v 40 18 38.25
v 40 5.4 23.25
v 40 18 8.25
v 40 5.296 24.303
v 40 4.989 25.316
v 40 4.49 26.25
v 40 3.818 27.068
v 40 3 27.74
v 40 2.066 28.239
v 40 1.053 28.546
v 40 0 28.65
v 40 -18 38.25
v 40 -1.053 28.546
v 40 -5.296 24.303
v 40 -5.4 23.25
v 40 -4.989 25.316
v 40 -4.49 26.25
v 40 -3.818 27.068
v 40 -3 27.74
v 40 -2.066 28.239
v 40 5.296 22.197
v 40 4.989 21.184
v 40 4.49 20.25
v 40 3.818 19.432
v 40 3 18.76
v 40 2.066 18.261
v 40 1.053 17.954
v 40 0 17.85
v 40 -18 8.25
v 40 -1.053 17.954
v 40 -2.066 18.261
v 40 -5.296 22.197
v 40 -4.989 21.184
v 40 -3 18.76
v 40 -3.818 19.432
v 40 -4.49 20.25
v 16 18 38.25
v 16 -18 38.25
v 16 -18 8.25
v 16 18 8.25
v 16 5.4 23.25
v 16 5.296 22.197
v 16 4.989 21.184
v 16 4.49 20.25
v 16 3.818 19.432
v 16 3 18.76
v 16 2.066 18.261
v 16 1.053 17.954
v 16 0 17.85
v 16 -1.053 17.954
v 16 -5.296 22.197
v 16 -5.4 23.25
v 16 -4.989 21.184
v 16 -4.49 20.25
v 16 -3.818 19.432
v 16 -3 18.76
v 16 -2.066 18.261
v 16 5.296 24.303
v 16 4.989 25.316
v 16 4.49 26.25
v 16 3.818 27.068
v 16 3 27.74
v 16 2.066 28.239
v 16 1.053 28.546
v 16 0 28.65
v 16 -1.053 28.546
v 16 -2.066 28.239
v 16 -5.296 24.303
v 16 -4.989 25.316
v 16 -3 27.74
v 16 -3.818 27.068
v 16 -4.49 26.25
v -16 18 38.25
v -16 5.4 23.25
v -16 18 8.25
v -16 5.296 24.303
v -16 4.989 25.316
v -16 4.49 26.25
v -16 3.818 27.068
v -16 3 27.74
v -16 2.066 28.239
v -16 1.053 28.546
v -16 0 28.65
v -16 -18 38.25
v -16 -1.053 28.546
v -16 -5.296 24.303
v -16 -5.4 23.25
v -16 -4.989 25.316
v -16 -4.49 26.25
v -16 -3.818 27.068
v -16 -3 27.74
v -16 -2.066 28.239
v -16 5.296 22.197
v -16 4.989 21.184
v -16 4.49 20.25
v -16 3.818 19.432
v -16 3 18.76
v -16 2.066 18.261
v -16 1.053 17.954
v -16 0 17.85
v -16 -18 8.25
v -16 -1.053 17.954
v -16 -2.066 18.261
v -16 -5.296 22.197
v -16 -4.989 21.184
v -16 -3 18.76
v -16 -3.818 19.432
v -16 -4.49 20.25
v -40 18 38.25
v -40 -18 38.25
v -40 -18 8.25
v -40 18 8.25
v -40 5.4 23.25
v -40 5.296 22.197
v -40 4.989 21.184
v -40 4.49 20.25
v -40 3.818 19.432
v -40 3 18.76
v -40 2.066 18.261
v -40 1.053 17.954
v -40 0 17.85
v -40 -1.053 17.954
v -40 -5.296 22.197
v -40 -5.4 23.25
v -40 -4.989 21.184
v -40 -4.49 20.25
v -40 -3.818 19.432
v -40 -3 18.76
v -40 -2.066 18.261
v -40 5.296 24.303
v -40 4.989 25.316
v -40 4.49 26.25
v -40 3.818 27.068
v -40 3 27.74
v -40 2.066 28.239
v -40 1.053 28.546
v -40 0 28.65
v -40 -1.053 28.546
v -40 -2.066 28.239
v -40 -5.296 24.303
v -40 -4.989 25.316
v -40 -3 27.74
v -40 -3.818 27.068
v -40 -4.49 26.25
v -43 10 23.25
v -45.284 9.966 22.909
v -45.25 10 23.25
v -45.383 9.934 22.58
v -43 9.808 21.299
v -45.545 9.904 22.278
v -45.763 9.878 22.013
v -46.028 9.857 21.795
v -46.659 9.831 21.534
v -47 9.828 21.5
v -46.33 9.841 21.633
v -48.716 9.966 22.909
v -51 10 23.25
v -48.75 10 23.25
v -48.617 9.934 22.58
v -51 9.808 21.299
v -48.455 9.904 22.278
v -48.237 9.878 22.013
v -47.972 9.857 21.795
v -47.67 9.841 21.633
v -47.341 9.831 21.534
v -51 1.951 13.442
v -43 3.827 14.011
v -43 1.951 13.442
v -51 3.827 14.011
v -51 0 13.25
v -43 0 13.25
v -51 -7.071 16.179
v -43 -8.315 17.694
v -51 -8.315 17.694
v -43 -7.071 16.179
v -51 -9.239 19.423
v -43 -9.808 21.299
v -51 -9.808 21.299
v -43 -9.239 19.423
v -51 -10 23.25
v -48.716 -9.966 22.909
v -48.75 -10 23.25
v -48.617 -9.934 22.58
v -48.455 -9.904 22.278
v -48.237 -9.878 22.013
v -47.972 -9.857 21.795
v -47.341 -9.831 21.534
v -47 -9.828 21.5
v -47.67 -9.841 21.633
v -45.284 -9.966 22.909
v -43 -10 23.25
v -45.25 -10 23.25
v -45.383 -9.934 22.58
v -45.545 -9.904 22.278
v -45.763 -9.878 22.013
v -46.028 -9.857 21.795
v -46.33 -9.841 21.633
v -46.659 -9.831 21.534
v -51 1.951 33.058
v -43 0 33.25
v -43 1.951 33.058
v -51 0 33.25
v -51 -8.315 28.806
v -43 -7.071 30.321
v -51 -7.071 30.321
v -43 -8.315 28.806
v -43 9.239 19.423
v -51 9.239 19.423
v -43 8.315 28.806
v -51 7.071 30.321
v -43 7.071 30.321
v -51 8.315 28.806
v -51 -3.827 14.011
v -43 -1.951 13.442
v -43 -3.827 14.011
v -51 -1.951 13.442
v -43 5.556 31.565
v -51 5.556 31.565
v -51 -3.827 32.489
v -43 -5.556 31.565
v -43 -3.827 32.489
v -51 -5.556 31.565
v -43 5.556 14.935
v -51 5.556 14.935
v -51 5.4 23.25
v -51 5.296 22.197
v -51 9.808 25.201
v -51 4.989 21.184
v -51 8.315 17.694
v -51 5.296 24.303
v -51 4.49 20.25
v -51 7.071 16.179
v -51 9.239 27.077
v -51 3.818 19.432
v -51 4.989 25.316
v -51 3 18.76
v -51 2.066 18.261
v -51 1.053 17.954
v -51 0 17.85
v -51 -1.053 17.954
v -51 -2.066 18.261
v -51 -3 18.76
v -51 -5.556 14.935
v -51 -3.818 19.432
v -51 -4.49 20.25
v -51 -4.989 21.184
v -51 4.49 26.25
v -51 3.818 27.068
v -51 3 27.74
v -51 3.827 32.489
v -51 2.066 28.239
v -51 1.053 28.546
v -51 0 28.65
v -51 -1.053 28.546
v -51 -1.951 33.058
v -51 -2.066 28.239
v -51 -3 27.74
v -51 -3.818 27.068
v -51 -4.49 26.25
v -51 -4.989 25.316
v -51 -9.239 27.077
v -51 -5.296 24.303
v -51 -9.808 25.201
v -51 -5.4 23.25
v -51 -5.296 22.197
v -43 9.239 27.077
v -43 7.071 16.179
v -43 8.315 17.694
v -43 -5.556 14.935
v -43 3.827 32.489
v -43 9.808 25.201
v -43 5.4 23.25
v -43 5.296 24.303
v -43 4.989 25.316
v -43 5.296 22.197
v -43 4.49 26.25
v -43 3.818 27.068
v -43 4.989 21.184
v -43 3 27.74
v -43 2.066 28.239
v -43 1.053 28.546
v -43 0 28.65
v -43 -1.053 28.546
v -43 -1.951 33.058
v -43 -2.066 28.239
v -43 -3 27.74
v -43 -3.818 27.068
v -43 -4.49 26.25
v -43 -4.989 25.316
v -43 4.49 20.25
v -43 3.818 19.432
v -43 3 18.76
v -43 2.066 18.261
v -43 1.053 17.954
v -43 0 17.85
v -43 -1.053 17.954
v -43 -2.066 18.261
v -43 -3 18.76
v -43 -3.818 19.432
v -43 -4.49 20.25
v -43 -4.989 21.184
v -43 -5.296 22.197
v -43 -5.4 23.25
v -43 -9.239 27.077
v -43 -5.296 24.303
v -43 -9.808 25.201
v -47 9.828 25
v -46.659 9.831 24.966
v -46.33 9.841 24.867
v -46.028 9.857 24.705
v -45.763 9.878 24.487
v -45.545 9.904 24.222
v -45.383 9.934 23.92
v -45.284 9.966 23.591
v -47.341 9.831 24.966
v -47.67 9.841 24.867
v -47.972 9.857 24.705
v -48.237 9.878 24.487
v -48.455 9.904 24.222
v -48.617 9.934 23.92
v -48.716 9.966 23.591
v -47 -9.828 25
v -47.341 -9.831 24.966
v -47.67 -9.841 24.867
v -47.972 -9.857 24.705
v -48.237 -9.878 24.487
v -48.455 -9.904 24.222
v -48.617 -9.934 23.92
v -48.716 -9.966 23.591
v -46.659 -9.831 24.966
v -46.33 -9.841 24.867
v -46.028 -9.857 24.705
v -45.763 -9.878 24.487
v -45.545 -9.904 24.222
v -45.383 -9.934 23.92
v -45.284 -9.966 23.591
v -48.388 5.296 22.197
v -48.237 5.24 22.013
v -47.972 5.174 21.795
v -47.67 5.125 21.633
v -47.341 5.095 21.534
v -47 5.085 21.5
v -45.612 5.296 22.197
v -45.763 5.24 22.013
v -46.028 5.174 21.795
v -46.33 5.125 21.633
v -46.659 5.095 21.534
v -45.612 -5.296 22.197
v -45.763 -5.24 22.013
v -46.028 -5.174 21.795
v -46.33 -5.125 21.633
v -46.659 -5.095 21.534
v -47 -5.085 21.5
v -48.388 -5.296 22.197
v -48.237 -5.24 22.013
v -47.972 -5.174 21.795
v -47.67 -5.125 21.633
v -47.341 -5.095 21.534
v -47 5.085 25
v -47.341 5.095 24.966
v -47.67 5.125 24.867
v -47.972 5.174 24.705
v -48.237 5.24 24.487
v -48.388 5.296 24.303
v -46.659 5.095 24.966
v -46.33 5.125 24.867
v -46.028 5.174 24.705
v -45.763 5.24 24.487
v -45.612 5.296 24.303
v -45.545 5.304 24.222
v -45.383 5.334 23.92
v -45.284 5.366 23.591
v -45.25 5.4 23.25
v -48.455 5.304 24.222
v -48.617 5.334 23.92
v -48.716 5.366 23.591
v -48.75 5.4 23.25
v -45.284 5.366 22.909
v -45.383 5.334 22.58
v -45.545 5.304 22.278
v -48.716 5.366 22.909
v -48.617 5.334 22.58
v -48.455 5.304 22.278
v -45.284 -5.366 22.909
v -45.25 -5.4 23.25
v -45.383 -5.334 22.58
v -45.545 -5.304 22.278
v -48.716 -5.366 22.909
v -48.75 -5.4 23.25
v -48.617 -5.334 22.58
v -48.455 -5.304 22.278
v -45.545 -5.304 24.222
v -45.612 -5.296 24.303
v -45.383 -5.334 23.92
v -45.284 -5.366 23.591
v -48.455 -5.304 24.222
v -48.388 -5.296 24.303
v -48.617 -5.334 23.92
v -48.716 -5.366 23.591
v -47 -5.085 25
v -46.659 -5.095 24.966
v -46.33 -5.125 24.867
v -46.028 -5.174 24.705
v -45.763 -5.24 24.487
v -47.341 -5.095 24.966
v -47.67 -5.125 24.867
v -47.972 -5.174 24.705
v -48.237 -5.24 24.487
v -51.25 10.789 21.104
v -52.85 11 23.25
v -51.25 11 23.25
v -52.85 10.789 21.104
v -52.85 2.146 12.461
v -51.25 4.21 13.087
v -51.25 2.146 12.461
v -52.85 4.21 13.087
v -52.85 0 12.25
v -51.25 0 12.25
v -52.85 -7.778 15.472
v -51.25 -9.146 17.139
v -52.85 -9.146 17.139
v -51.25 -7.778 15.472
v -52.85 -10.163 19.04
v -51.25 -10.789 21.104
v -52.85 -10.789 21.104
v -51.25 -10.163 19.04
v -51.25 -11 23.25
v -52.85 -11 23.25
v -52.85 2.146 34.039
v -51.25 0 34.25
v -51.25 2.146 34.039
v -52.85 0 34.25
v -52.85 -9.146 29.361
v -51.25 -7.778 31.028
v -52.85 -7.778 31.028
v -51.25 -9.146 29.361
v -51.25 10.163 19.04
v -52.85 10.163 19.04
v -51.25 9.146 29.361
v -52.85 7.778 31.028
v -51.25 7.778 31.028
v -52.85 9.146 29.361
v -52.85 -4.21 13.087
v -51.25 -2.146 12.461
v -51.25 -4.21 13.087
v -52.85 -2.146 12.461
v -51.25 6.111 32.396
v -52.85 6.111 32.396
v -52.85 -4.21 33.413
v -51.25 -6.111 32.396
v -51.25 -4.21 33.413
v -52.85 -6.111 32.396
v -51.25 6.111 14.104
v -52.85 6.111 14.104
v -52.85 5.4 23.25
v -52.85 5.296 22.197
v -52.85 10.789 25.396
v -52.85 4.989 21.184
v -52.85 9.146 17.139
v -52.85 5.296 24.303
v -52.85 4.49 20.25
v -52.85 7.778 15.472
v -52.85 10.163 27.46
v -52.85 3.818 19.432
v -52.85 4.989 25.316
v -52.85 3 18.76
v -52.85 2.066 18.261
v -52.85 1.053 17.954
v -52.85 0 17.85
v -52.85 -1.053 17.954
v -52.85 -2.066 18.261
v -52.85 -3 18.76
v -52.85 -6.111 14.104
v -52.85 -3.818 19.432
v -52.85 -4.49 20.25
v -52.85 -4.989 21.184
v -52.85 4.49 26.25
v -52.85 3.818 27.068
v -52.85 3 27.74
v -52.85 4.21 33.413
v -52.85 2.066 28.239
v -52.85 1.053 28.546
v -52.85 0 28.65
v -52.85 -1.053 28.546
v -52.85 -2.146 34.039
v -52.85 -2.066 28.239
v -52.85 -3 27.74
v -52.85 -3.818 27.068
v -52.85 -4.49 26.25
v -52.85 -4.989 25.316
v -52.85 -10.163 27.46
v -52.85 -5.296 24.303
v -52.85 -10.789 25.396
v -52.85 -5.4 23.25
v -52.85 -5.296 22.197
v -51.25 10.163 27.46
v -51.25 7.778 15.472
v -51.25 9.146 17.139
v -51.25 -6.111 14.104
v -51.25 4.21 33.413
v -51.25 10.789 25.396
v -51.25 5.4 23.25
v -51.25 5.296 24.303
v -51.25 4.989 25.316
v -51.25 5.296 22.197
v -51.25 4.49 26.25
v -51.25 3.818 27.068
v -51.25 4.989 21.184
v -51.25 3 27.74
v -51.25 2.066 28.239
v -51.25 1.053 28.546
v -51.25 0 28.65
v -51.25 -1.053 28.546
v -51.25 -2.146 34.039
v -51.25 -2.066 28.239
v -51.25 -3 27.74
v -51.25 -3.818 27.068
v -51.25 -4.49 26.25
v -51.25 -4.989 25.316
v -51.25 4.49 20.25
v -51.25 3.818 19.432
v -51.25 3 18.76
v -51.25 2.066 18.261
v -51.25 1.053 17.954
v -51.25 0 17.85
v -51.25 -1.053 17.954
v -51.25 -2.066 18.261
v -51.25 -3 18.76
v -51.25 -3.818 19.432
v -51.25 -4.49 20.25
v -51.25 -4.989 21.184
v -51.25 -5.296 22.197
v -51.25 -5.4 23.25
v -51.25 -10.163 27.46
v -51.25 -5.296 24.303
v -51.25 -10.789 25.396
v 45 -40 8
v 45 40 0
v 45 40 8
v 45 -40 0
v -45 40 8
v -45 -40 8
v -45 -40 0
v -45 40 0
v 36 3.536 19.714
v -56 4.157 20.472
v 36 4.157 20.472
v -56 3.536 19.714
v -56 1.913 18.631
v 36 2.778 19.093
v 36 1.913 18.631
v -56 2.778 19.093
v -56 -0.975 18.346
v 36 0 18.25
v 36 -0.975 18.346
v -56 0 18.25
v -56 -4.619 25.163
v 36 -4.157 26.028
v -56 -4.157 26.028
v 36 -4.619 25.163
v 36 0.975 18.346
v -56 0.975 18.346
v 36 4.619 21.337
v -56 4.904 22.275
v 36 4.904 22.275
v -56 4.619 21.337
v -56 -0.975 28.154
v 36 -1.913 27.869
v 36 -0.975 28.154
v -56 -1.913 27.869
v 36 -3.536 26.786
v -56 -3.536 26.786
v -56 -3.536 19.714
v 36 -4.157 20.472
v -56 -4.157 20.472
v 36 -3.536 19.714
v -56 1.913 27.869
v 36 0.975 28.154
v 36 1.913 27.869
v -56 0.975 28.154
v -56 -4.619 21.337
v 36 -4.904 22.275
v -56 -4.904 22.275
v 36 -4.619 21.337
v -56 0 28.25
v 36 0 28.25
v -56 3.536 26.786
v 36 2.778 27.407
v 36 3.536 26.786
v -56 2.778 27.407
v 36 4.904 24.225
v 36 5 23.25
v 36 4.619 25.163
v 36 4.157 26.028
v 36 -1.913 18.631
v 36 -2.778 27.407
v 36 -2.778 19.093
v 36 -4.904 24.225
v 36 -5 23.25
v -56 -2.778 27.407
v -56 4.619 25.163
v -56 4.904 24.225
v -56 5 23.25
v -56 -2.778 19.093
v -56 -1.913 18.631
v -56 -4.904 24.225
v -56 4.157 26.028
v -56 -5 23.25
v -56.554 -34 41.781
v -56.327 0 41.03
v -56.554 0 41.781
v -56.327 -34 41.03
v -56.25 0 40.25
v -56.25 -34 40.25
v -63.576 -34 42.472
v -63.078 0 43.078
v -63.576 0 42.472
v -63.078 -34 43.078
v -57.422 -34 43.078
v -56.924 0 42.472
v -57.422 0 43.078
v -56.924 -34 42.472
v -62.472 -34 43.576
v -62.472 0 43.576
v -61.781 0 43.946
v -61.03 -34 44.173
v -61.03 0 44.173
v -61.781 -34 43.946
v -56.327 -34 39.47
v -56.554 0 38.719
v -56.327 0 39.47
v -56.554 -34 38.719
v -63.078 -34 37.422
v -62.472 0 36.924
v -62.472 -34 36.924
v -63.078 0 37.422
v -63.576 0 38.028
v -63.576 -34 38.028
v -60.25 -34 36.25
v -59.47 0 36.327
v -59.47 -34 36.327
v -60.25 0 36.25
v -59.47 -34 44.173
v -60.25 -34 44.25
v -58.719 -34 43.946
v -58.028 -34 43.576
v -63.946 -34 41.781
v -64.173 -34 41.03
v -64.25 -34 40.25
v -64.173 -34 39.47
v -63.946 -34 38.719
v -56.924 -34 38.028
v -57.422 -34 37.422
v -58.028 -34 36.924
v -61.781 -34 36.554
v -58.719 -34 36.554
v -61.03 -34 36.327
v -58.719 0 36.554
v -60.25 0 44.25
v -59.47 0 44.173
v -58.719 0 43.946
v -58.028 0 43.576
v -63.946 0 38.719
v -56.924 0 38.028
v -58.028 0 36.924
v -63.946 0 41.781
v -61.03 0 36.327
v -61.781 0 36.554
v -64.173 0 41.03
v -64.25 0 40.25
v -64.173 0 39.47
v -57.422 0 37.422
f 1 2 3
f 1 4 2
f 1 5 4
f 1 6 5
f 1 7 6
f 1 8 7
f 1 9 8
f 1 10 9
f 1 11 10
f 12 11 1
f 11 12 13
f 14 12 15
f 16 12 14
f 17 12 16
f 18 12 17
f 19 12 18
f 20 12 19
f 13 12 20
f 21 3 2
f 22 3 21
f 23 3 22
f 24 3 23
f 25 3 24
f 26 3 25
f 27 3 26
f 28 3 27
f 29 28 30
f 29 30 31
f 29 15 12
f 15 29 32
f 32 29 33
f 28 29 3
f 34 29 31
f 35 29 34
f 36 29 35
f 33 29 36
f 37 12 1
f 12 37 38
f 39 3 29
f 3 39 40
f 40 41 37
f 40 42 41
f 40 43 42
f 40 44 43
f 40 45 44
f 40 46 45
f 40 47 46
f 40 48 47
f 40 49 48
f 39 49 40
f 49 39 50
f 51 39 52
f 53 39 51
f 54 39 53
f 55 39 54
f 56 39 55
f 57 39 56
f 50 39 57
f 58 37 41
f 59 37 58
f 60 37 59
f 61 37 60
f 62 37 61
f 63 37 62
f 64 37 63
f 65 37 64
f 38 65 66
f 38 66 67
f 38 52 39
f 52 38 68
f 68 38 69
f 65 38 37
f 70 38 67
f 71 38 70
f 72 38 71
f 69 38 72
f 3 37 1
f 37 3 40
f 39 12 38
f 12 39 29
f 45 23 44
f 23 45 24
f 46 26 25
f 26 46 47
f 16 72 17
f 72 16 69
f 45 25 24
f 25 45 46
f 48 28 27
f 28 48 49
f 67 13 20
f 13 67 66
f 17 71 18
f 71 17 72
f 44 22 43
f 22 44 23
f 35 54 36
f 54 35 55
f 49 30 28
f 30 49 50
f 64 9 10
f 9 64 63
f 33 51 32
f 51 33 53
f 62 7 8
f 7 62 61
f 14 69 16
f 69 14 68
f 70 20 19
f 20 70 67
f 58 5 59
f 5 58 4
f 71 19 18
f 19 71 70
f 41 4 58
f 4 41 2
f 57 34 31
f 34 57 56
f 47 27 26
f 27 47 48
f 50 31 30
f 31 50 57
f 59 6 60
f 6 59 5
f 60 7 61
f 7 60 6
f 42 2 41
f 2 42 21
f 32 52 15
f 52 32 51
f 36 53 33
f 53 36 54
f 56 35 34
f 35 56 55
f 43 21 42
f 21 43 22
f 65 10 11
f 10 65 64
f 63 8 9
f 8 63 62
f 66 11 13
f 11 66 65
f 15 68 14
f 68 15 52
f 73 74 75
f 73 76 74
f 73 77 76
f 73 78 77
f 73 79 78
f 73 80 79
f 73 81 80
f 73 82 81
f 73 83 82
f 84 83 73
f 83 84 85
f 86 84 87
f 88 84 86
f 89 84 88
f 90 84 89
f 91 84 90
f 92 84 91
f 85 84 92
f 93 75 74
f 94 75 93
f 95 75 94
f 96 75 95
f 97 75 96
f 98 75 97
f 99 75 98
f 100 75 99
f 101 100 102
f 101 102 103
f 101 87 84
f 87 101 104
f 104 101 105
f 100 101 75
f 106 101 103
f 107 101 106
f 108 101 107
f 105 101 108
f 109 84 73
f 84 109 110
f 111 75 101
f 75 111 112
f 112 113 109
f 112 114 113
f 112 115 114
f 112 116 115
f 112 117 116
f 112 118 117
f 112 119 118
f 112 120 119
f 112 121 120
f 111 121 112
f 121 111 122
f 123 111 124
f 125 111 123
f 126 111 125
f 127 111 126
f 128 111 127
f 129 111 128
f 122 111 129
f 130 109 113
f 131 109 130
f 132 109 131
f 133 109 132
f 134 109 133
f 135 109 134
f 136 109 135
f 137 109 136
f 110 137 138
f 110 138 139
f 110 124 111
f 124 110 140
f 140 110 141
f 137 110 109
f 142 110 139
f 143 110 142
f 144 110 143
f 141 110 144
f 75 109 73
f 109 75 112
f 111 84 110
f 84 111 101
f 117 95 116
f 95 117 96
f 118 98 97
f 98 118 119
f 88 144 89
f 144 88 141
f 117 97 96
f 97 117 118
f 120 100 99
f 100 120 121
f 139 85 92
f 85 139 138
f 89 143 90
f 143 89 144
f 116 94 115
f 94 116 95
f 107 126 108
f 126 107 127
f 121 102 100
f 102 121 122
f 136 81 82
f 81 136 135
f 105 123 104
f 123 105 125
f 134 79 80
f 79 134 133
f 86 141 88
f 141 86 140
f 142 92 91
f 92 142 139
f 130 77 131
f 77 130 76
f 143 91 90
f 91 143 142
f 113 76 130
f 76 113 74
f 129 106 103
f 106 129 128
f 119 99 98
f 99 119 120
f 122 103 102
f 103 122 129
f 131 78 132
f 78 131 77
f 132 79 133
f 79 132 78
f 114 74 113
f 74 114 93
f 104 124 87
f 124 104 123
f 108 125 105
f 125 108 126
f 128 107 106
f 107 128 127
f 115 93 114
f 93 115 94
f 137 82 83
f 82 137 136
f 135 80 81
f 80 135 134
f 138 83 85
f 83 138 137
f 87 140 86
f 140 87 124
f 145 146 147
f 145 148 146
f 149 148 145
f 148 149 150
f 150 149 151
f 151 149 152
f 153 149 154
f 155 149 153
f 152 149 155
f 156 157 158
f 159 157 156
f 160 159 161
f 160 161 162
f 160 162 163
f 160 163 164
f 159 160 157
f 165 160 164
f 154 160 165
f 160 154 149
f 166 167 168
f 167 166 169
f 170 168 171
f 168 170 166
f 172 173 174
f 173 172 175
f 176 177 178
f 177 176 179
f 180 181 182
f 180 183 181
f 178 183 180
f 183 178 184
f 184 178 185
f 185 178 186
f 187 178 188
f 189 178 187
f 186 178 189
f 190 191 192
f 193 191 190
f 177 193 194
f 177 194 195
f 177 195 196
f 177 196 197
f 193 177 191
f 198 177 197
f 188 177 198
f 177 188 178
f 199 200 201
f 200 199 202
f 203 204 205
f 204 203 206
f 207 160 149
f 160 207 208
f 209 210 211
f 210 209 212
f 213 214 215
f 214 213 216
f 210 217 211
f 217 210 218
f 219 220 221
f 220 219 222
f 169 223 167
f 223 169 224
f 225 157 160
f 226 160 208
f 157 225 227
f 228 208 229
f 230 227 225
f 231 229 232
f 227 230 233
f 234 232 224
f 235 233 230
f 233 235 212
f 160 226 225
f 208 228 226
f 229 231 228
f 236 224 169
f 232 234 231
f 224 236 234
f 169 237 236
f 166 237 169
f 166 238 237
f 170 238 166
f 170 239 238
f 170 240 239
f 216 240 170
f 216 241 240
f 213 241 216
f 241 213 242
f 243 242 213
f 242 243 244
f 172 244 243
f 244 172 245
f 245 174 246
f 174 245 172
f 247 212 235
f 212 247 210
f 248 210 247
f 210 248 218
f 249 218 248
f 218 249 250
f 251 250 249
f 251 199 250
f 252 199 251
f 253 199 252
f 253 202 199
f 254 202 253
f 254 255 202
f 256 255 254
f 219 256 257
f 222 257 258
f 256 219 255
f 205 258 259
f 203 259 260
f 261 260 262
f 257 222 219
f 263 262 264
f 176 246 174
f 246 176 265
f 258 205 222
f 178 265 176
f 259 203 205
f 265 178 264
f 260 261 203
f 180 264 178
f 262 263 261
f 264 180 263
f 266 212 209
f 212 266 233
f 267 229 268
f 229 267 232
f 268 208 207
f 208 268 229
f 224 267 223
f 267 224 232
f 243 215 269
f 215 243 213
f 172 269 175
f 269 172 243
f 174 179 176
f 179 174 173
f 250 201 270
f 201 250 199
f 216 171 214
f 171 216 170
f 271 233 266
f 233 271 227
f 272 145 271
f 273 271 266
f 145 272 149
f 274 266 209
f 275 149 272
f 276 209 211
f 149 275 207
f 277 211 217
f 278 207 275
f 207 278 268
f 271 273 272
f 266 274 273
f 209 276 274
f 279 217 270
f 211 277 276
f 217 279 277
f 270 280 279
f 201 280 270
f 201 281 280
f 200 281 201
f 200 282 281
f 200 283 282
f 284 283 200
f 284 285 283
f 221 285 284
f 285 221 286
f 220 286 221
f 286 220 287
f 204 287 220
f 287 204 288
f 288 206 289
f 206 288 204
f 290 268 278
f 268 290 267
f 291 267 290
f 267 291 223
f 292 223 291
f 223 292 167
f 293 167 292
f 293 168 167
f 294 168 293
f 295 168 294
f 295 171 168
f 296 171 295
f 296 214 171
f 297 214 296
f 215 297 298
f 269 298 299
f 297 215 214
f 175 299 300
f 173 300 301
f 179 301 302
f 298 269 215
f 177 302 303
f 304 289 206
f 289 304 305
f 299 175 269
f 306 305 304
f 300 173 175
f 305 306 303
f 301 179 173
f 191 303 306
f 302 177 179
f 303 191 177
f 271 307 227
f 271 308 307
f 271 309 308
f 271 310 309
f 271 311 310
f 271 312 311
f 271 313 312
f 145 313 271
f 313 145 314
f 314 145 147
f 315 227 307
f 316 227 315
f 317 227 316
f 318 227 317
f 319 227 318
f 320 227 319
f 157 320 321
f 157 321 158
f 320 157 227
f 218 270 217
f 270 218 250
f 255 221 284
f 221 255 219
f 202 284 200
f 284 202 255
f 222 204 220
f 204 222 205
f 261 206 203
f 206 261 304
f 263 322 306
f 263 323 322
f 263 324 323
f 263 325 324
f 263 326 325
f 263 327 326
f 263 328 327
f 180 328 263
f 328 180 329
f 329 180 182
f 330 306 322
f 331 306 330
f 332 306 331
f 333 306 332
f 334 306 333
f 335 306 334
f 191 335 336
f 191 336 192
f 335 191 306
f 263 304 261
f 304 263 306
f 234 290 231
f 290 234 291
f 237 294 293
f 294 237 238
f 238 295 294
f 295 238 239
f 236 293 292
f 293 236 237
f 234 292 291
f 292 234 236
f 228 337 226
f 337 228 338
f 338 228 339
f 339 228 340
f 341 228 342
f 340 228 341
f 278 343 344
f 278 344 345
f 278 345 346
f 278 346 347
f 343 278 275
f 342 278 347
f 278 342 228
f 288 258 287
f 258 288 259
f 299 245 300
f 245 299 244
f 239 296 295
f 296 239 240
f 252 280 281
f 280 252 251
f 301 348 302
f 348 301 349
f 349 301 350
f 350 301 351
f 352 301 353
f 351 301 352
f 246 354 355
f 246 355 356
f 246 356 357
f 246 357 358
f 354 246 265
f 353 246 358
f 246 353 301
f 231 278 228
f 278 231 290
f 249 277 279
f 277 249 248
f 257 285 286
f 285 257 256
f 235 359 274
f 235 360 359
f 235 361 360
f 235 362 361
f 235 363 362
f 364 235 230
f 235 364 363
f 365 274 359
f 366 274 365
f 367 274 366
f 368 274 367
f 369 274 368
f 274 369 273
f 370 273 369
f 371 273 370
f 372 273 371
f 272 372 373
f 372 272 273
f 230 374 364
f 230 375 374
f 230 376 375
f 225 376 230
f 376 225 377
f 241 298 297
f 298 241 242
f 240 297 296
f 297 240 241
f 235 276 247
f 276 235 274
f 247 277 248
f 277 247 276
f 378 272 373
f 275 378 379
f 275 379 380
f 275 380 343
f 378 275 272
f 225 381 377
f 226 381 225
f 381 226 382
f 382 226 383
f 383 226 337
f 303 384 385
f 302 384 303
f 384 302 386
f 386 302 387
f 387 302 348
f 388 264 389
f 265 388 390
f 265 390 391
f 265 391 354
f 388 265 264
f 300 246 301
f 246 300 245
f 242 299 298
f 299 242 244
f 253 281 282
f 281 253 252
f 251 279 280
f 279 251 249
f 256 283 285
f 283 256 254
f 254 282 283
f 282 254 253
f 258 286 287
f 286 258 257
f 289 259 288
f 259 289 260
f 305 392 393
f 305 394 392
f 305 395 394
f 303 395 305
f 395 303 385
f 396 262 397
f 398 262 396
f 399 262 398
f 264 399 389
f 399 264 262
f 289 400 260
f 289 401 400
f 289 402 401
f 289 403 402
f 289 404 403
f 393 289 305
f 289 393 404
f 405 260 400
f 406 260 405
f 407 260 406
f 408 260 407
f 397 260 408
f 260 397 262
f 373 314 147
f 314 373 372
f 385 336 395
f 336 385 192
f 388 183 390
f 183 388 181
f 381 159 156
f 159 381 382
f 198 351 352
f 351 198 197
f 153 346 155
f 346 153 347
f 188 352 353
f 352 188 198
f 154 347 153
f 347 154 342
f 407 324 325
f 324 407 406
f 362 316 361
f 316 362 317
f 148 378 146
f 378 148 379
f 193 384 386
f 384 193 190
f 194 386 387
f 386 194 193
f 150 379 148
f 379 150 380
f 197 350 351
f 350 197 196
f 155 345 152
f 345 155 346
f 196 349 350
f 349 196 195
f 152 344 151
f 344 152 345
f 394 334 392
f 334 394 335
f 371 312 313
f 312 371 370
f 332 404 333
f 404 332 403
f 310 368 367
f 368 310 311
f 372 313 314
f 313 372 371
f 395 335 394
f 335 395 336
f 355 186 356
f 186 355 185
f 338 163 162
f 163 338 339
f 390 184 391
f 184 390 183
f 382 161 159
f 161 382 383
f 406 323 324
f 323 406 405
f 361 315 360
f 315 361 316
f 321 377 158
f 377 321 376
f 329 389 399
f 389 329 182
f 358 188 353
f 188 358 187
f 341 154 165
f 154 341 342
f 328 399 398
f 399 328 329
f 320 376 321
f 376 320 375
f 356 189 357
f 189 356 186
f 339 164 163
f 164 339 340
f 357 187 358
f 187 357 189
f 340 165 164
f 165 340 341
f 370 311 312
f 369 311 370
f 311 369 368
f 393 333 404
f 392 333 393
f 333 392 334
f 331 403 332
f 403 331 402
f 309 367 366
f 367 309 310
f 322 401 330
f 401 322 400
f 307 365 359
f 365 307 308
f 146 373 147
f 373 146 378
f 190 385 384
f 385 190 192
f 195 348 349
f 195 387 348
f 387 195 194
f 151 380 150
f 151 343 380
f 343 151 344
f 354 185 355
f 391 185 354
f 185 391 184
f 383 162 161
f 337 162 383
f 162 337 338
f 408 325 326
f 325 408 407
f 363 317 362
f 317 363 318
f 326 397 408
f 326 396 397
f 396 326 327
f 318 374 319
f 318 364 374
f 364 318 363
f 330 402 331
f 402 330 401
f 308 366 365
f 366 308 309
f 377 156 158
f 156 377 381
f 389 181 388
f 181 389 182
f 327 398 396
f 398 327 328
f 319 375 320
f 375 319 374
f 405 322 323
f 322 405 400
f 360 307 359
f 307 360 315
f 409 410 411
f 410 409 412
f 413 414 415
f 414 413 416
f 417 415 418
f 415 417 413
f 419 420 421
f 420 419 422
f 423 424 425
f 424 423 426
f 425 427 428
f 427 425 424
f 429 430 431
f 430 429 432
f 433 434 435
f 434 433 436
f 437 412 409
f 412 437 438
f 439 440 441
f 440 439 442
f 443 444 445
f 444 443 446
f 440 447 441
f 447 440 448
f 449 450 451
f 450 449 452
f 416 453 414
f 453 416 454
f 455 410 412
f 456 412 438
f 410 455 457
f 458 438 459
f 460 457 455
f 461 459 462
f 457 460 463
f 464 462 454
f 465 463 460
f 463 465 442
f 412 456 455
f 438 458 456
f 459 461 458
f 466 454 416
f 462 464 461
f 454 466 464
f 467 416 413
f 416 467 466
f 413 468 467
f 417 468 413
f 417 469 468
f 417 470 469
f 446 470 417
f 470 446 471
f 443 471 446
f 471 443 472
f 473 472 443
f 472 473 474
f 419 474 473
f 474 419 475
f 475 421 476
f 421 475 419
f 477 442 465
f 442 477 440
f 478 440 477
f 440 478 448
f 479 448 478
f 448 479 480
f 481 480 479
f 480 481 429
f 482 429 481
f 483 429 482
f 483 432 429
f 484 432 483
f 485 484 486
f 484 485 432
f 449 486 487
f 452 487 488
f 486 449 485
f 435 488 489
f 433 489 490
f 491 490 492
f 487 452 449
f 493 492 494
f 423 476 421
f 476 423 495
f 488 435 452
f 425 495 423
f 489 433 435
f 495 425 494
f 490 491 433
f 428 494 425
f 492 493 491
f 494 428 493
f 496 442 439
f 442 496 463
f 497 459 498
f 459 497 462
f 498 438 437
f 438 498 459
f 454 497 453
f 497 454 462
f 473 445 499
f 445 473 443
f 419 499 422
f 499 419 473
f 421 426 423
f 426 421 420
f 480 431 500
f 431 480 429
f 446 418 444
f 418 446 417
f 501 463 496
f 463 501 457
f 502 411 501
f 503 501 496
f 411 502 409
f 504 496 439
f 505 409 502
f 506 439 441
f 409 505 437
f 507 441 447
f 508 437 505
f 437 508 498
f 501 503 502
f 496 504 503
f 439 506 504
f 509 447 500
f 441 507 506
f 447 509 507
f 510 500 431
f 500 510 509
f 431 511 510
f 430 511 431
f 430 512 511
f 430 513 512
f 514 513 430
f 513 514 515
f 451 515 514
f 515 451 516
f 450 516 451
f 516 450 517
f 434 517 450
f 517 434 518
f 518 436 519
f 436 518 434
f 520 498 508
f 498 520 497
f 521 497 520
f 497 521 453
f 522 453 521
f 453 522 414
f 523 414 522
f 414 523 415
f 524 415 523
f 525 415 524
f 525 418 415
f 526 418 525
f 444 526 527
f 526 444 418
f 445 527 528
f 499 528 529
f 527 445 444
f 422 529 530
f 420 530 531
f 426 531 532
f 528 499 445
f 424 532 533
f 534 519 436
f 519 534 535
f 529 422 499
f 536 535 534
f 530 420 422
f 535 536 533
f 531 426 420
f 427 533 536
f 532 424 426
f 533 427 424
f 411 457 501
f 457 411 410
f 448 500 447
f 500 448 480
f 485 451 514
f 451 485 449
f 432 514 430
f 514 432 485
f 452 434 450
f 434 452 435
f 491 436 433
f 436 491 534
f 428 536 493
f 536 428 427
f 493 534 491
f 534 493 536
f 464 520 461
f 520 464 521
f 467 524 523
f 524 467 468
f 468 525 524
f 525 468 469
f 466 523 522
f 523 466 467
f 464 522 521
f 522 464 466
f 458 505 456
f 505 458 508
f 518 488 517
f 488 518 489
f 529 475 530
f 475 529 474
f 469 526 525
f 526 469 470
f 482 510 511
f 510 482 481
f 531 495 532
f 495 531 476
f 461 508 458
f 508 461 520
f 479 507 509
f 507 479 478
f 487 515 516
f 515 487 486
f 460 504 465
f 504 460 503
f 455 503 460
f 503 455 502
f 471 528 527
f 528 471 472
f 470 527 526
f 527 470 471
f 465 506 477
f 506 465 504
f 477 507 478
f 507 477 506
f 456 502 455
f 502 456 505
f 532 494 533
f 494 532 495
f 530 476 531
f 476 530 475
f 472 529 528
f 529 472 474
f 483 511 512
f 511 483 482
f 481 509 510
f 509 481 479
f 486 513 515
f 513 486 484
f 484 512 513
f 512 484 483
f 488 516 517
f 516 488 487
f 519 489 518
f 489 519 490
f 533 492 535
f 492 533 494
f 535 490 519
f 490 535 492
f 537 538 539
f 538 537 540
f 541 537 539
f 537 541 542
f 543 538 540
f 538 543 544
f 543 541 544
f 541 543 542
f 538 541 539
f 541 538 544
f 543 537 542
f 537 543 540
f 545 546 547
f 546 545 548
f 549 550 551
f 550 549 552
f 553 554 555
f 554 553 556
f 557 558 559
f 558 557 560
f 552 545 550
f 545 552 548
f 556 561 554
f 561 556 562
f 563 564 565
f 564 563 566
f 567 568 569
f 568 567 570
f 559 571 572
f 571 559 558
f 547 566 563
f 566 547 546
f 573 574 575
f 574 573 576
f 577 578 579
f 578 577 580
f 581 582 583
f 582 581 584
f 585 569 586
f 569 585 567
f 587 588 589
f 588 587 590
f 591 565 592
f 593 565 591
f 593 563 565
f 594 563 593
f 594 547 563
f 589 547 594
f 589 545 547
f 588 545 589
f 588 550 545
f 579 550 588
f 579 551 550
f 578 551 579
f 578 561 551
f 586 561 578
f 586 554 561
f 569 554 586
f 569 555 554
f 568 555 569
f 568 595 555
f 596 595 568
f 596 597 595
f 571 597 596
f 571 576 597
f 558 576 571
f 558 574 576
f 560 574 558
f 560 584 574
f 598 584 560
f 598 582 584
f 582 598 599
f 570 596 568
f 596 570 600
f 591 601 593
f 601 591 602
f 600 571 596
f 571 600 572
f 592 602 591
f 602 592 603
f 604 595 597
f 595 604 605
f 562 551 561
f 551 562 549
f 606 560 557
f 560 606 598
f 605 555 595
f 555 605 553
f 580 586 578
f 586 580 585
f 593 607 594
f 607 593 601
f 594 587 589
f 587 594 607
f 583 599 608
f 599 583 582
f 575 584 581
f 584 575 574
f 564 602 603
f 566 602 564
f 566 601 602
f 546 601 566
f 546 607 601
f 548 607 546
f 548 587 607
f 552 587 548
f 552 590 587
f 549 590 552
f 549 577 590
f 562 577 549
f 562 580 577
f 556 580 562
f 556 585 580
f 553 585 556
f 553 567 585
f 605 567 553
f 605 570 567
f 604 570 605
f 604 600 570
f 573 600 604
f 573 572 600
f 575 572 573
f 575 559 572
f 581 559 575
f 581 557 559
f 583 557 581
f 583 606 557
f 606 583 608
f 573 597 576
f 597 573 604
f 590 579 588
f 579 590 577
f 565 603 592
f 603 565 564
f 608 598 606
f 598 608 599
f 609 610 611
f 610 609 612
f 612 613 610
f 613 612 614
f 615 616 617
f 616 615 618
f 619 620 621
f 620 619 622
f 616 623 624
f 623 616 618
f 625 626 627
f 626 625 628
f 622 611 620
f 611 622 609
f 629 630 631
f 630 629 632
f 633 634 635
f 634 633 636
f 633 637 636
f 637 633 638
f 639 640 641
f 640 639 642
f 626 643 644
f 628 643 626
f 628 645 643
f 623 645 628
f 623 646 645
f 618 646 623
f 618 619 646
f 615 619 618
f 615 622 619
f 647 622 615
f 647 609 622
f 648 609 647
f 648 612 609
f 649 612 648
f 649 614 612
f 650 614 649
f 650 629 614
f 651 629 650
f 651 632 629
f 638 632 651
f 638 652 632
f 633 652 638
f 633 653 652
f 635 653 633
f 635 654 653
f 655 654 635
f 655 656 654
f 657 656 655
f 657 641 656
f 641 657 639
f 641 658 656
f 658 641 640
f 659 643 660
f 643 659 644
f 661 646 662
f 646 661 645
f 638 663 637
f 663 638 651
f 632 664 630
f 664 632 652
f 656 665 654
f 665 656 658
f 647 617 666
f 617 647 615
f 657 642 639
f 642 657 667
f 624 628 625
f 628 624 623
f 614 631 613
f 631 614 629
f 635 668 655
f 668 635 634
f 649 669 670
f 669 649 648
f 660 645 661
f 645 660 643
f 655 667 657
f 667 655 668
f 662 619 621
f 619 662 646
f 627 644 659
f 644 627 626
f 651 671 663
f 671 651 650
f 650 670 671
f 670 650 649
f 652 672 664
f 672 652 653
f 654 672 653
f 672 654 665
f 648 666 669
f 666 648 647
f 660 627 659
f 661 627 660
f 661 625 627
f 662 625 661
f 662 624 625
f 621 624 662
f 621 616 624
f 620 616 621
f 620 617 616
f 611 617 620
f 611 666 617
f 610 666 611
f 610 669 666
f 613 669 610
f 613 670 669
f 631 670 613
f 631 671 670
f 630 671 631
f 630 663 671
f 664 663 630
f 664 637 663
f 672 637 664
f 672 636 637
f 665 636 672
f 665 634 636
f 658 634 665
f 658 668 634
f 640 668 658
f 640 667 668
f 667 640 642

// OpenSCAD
$fn = 32;

// ------------------------------------------------------------------------
// Machine vise: screw d10, jaws 24 x 30 mm
// Every part is its own module, assembly() places every instance.
// ------------------------------------------------------------------------

// --- part 1 ---
module vise_bed() {
  difference() {
    translate([-45, -40, 0]) cube([90, 80, 8]);
  }
}

// --- part 2 ---
module vise_jaw() {
  difference() {
    translate([-12, -18, 0]) cube([24, 36, 30]);
    translate([0, 0, 15]) rotate([0, 90, 0]) cylinder(h = 26, d = 10.8, center = true);
  }
}

// --- part 3 ---
module vise_screw() {
  translate([0, 0, -46]) cylinder(h = 92, d = 10);
}

// --- part 4 ---
module screw_collar() {
  difference() {
    cylinder(h = 8, d = 20);
    translate([0, 0, -1]) cylinder(h = 10, d = 10.8);
    translate([0, 0, 4]) rotate([90, 0, 0]) cylinder(h = 22, d = 3.5, center = true);
  }
}

// --- part 5 ---
module screw_washer() {
  difference() {
      translate([0, 0, 0]) cylinder(h = 1.6, d = 22);
      translate([0, 0, -1]) cylinder(h = 3.6, d = 10.8);
    }
}

// --- part 6 ---
module vise_handle() {
  cylinder(h = 34, d = 8);
}

// --- assembly ---
module assembly() {
  color([0.80, 0.24, 0.20]) translate([0, 0, 0]) rotate([0, 0, 0]) vise_bed();
  color([0.20, 0.45, 0.75]) translate([28, 0, 8.25]) rotate([0, 0, 0]) vise_jaw();
  color([0.25, 0.62, 0.32]) translate([-28, 0, 8.25]) rotate([0, 0, 0]) vise_jaw();
  color([0.92, 0.70, 0.18]) translate([-10, 0, 23.25]) rotate([0, 90, 0]) vise_screw();
  color([0.58, 0.35, 0.70]) translate([-51, 0, 23.25]) rotate([0, 90, 0]) screw_collar();
  color([0.16, 0.66, 0.66]) translate([-52.85, 0, 23.25]) rotate([0, 90, 0]) screw_washer();
  color([0.85, 0.48, 0.18]) translate([-60.25, 0, 40.25]) rotate([90, 0, 0]) vise_handle();
}

assembly();
